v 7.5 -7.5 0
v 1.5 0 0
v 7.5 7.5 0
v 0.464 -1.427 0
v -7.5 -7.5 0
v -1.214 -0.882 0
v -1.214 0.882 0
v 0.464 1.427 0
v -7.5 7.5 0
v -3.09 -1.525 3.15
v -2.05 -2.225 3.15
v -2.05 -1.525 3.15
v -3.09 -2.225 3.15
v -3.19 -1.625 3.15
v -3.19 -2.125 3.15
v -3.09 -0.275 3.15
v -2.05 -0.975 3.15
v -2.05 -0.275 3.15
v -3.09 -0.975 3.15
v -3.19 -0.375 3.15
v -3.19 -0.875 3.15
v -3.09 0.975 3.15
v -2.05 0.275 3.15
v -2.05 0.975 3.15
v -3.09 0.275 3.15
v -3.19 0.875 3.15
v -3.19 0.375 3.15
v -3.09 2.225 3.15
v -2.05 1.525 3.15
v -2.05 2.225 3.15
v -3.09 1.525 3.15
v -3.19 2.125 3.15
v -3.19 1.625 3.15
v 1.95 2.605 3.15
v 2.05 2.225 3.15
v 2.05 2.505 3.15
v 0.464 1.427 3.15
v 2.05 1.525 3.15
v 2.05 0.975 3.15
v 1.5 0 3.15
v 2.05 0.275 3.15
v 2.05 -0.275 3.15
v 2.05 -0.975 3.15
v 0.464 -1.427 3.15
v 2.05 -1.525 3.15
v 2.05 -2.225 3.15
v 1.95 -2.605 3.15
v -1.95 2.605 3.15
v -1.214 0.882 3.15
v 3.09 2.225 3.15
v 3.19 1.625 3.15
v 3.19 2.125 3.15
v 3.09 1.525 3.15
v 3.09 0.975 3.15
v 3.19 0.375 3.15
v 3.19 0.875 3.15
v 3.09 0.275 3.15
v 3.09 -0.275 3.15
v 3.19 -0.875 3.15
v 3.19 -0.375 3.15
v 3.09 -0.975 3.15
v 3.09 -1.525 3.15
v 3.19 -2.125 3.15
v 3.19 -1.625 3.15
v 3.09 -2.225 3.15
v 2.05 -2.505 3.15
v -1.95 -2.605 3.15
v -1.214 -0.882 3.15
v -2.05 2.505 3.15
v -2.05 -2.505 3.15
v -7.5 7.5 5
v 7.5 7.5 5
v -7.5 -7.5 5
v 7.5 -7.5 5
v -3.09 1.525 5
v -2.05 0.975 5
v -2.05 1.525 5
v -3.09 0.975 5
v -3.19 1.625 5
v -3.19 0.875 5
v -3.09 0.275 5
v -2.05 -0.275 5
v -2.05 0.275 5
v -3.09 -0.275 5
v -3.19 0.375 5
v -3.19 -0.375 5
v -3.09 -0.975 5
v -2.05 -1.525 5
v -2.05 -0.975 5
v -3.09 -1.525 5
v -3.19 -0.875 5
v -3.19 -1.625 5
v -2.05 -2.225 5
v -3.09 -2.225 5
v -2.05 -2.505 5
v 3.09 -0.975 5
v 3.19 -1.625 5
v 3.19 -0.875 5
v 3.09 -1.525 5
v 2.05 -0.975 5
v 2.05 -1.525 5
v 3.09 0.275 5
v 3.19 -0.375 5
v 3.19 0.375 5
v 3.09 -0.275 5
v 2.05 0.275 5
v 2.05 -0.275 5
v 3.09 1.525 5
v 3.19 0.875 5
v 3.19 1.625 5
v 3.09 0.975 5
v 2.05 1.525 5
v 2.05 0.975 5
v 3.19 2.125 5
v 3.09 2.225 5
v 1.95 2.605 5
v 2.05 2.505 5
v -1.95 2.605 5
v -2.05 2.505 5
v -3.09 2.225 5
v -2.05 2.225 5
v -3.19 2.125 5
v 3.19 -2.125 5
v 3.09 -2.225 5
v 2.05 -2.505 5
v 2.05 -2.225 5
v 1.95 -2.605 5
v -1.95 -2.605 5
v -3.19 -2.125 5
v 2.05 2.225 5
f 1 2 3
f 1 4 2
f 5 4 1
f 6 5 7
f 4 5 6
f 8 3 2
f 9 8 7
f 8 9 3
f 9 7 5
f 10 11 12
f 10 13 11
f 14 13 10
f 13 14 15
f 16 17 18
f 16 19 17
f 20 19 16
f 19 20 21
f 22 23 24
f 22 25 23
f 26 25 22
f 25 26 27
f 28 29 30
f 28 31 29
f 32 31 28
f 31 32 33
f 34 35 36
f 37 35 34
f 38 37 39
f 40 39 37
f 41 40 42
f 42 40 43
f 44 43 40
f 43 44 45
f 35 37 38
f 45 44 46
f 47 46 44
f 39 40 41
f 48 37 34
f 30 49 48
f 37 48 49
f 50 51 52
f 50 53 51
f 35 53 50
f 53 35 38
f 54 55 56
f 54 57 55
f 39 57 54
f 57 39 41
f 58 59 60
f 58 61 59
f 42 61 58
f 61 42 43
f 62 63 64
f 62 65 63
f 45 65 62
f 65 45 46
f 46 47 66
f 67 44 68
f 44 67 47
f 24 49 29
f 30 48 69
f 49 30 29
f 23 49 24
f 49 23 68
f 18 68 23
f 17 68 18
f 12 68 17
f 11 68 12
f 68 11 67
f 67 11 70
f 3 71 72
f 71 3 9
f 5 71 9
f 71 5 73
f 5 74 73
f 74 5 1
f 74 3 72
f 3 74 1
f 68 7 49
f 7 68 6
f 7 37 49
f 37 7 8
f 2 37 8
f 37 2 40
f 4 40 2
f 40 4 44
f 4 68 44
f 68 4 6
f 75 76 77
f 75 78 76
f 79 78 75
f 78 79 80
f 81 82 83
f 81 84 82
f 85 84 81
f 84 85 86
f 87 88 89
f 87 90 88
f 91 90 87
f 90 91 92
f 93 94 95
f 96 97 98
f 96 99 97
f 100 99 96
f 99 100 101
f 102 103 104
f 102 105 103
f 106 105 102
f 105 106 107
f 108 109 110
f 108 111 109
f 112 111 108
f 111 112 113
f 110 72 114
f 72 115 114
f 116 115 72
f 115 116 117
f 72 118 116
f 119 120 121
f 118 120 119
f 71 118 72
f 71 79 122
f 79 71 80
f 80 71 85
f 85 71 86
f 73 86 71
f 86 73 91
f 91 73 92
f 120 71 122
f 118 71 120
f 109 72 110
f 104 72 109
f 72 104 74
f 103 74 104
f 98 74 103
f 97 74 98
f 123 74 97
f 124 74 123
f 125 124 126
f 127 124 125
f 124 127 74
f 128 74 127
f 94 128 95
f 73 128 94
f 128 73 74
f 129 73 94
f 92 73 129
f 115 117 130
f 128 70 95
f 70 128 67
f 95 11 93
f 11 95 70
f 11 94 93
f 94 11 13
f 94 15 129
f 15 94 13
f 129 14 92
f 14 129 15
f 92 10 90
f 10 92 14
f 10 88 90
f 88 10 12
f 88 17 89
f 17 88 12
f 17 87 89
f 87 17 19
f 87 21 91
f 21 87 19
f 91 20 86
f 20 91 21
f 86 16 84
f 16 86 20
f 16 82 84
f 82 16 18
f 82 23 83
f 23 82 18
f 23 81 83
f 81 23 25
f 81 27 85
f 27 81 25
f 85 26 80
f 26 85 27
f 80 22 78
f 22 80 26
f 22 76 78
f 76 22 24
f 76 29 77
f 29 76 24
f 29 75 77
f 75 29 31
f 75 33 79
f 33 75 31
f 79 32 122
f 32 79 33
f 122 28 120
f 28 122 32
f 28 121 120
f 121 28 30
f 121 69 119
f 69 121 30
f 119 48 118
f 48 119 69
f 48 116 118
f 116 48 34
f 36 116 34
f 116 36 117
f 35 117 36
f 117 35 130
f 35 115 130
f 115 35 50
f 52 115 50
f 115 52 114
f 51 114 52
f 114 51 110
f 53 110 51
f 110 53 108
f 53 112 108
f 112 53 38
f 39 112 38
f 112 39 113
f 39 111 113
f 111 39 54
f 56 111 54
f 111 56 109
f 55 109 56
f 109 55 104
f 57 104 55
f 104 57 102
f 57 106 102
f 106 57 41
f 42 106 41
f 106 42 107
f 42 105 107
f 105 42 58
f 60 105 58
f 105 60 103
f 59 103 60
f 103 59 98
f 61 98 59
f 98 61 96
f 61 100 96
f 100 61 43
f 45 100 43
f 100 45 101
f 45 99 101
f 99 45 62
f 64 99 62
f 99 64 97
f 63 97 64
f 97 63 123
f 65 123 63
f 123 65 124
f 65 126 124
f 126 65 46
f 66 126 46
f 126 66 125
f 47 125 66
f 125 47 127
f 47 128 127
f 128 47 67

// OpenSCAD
/* SO package adapter */

/* [Dimensions] */
ovDims=[15,15,5];
cntrHoleDia=3;
recessHght=1.85;

icBdyDims=[3.9,5.01,1.44];
icOvWdth=6.18;
icSpcng=0.1;
icPitch=1.25;
icLeadWdth=0.5;
icLeadThck=0.27;
icPins=8;

probeDia=0.75;


//base
linear_extrude(ovDims.z-recessHght) difference(){
  square([ovDims.x,ovDims.y],true);
  circle(d=cntrHoleDia);
}

//recess
translate([0,0,ovDims.z-recessHght]) linear_extrude(recessHght) difference(){
  square([ovDims.x,ovDims.y],true);
  icShape();
}

module icShape(){
  offset(icSpcng) square([icBdyDims.x,icBdyDims.y],true);
  for (iy=[-(icPins/2-1)/2:(icPins/2-1)/2])
    translate([0,iy*icPitch]) offset(icSpcng) square([icOvWdth,icLeadWdth],true);
}
